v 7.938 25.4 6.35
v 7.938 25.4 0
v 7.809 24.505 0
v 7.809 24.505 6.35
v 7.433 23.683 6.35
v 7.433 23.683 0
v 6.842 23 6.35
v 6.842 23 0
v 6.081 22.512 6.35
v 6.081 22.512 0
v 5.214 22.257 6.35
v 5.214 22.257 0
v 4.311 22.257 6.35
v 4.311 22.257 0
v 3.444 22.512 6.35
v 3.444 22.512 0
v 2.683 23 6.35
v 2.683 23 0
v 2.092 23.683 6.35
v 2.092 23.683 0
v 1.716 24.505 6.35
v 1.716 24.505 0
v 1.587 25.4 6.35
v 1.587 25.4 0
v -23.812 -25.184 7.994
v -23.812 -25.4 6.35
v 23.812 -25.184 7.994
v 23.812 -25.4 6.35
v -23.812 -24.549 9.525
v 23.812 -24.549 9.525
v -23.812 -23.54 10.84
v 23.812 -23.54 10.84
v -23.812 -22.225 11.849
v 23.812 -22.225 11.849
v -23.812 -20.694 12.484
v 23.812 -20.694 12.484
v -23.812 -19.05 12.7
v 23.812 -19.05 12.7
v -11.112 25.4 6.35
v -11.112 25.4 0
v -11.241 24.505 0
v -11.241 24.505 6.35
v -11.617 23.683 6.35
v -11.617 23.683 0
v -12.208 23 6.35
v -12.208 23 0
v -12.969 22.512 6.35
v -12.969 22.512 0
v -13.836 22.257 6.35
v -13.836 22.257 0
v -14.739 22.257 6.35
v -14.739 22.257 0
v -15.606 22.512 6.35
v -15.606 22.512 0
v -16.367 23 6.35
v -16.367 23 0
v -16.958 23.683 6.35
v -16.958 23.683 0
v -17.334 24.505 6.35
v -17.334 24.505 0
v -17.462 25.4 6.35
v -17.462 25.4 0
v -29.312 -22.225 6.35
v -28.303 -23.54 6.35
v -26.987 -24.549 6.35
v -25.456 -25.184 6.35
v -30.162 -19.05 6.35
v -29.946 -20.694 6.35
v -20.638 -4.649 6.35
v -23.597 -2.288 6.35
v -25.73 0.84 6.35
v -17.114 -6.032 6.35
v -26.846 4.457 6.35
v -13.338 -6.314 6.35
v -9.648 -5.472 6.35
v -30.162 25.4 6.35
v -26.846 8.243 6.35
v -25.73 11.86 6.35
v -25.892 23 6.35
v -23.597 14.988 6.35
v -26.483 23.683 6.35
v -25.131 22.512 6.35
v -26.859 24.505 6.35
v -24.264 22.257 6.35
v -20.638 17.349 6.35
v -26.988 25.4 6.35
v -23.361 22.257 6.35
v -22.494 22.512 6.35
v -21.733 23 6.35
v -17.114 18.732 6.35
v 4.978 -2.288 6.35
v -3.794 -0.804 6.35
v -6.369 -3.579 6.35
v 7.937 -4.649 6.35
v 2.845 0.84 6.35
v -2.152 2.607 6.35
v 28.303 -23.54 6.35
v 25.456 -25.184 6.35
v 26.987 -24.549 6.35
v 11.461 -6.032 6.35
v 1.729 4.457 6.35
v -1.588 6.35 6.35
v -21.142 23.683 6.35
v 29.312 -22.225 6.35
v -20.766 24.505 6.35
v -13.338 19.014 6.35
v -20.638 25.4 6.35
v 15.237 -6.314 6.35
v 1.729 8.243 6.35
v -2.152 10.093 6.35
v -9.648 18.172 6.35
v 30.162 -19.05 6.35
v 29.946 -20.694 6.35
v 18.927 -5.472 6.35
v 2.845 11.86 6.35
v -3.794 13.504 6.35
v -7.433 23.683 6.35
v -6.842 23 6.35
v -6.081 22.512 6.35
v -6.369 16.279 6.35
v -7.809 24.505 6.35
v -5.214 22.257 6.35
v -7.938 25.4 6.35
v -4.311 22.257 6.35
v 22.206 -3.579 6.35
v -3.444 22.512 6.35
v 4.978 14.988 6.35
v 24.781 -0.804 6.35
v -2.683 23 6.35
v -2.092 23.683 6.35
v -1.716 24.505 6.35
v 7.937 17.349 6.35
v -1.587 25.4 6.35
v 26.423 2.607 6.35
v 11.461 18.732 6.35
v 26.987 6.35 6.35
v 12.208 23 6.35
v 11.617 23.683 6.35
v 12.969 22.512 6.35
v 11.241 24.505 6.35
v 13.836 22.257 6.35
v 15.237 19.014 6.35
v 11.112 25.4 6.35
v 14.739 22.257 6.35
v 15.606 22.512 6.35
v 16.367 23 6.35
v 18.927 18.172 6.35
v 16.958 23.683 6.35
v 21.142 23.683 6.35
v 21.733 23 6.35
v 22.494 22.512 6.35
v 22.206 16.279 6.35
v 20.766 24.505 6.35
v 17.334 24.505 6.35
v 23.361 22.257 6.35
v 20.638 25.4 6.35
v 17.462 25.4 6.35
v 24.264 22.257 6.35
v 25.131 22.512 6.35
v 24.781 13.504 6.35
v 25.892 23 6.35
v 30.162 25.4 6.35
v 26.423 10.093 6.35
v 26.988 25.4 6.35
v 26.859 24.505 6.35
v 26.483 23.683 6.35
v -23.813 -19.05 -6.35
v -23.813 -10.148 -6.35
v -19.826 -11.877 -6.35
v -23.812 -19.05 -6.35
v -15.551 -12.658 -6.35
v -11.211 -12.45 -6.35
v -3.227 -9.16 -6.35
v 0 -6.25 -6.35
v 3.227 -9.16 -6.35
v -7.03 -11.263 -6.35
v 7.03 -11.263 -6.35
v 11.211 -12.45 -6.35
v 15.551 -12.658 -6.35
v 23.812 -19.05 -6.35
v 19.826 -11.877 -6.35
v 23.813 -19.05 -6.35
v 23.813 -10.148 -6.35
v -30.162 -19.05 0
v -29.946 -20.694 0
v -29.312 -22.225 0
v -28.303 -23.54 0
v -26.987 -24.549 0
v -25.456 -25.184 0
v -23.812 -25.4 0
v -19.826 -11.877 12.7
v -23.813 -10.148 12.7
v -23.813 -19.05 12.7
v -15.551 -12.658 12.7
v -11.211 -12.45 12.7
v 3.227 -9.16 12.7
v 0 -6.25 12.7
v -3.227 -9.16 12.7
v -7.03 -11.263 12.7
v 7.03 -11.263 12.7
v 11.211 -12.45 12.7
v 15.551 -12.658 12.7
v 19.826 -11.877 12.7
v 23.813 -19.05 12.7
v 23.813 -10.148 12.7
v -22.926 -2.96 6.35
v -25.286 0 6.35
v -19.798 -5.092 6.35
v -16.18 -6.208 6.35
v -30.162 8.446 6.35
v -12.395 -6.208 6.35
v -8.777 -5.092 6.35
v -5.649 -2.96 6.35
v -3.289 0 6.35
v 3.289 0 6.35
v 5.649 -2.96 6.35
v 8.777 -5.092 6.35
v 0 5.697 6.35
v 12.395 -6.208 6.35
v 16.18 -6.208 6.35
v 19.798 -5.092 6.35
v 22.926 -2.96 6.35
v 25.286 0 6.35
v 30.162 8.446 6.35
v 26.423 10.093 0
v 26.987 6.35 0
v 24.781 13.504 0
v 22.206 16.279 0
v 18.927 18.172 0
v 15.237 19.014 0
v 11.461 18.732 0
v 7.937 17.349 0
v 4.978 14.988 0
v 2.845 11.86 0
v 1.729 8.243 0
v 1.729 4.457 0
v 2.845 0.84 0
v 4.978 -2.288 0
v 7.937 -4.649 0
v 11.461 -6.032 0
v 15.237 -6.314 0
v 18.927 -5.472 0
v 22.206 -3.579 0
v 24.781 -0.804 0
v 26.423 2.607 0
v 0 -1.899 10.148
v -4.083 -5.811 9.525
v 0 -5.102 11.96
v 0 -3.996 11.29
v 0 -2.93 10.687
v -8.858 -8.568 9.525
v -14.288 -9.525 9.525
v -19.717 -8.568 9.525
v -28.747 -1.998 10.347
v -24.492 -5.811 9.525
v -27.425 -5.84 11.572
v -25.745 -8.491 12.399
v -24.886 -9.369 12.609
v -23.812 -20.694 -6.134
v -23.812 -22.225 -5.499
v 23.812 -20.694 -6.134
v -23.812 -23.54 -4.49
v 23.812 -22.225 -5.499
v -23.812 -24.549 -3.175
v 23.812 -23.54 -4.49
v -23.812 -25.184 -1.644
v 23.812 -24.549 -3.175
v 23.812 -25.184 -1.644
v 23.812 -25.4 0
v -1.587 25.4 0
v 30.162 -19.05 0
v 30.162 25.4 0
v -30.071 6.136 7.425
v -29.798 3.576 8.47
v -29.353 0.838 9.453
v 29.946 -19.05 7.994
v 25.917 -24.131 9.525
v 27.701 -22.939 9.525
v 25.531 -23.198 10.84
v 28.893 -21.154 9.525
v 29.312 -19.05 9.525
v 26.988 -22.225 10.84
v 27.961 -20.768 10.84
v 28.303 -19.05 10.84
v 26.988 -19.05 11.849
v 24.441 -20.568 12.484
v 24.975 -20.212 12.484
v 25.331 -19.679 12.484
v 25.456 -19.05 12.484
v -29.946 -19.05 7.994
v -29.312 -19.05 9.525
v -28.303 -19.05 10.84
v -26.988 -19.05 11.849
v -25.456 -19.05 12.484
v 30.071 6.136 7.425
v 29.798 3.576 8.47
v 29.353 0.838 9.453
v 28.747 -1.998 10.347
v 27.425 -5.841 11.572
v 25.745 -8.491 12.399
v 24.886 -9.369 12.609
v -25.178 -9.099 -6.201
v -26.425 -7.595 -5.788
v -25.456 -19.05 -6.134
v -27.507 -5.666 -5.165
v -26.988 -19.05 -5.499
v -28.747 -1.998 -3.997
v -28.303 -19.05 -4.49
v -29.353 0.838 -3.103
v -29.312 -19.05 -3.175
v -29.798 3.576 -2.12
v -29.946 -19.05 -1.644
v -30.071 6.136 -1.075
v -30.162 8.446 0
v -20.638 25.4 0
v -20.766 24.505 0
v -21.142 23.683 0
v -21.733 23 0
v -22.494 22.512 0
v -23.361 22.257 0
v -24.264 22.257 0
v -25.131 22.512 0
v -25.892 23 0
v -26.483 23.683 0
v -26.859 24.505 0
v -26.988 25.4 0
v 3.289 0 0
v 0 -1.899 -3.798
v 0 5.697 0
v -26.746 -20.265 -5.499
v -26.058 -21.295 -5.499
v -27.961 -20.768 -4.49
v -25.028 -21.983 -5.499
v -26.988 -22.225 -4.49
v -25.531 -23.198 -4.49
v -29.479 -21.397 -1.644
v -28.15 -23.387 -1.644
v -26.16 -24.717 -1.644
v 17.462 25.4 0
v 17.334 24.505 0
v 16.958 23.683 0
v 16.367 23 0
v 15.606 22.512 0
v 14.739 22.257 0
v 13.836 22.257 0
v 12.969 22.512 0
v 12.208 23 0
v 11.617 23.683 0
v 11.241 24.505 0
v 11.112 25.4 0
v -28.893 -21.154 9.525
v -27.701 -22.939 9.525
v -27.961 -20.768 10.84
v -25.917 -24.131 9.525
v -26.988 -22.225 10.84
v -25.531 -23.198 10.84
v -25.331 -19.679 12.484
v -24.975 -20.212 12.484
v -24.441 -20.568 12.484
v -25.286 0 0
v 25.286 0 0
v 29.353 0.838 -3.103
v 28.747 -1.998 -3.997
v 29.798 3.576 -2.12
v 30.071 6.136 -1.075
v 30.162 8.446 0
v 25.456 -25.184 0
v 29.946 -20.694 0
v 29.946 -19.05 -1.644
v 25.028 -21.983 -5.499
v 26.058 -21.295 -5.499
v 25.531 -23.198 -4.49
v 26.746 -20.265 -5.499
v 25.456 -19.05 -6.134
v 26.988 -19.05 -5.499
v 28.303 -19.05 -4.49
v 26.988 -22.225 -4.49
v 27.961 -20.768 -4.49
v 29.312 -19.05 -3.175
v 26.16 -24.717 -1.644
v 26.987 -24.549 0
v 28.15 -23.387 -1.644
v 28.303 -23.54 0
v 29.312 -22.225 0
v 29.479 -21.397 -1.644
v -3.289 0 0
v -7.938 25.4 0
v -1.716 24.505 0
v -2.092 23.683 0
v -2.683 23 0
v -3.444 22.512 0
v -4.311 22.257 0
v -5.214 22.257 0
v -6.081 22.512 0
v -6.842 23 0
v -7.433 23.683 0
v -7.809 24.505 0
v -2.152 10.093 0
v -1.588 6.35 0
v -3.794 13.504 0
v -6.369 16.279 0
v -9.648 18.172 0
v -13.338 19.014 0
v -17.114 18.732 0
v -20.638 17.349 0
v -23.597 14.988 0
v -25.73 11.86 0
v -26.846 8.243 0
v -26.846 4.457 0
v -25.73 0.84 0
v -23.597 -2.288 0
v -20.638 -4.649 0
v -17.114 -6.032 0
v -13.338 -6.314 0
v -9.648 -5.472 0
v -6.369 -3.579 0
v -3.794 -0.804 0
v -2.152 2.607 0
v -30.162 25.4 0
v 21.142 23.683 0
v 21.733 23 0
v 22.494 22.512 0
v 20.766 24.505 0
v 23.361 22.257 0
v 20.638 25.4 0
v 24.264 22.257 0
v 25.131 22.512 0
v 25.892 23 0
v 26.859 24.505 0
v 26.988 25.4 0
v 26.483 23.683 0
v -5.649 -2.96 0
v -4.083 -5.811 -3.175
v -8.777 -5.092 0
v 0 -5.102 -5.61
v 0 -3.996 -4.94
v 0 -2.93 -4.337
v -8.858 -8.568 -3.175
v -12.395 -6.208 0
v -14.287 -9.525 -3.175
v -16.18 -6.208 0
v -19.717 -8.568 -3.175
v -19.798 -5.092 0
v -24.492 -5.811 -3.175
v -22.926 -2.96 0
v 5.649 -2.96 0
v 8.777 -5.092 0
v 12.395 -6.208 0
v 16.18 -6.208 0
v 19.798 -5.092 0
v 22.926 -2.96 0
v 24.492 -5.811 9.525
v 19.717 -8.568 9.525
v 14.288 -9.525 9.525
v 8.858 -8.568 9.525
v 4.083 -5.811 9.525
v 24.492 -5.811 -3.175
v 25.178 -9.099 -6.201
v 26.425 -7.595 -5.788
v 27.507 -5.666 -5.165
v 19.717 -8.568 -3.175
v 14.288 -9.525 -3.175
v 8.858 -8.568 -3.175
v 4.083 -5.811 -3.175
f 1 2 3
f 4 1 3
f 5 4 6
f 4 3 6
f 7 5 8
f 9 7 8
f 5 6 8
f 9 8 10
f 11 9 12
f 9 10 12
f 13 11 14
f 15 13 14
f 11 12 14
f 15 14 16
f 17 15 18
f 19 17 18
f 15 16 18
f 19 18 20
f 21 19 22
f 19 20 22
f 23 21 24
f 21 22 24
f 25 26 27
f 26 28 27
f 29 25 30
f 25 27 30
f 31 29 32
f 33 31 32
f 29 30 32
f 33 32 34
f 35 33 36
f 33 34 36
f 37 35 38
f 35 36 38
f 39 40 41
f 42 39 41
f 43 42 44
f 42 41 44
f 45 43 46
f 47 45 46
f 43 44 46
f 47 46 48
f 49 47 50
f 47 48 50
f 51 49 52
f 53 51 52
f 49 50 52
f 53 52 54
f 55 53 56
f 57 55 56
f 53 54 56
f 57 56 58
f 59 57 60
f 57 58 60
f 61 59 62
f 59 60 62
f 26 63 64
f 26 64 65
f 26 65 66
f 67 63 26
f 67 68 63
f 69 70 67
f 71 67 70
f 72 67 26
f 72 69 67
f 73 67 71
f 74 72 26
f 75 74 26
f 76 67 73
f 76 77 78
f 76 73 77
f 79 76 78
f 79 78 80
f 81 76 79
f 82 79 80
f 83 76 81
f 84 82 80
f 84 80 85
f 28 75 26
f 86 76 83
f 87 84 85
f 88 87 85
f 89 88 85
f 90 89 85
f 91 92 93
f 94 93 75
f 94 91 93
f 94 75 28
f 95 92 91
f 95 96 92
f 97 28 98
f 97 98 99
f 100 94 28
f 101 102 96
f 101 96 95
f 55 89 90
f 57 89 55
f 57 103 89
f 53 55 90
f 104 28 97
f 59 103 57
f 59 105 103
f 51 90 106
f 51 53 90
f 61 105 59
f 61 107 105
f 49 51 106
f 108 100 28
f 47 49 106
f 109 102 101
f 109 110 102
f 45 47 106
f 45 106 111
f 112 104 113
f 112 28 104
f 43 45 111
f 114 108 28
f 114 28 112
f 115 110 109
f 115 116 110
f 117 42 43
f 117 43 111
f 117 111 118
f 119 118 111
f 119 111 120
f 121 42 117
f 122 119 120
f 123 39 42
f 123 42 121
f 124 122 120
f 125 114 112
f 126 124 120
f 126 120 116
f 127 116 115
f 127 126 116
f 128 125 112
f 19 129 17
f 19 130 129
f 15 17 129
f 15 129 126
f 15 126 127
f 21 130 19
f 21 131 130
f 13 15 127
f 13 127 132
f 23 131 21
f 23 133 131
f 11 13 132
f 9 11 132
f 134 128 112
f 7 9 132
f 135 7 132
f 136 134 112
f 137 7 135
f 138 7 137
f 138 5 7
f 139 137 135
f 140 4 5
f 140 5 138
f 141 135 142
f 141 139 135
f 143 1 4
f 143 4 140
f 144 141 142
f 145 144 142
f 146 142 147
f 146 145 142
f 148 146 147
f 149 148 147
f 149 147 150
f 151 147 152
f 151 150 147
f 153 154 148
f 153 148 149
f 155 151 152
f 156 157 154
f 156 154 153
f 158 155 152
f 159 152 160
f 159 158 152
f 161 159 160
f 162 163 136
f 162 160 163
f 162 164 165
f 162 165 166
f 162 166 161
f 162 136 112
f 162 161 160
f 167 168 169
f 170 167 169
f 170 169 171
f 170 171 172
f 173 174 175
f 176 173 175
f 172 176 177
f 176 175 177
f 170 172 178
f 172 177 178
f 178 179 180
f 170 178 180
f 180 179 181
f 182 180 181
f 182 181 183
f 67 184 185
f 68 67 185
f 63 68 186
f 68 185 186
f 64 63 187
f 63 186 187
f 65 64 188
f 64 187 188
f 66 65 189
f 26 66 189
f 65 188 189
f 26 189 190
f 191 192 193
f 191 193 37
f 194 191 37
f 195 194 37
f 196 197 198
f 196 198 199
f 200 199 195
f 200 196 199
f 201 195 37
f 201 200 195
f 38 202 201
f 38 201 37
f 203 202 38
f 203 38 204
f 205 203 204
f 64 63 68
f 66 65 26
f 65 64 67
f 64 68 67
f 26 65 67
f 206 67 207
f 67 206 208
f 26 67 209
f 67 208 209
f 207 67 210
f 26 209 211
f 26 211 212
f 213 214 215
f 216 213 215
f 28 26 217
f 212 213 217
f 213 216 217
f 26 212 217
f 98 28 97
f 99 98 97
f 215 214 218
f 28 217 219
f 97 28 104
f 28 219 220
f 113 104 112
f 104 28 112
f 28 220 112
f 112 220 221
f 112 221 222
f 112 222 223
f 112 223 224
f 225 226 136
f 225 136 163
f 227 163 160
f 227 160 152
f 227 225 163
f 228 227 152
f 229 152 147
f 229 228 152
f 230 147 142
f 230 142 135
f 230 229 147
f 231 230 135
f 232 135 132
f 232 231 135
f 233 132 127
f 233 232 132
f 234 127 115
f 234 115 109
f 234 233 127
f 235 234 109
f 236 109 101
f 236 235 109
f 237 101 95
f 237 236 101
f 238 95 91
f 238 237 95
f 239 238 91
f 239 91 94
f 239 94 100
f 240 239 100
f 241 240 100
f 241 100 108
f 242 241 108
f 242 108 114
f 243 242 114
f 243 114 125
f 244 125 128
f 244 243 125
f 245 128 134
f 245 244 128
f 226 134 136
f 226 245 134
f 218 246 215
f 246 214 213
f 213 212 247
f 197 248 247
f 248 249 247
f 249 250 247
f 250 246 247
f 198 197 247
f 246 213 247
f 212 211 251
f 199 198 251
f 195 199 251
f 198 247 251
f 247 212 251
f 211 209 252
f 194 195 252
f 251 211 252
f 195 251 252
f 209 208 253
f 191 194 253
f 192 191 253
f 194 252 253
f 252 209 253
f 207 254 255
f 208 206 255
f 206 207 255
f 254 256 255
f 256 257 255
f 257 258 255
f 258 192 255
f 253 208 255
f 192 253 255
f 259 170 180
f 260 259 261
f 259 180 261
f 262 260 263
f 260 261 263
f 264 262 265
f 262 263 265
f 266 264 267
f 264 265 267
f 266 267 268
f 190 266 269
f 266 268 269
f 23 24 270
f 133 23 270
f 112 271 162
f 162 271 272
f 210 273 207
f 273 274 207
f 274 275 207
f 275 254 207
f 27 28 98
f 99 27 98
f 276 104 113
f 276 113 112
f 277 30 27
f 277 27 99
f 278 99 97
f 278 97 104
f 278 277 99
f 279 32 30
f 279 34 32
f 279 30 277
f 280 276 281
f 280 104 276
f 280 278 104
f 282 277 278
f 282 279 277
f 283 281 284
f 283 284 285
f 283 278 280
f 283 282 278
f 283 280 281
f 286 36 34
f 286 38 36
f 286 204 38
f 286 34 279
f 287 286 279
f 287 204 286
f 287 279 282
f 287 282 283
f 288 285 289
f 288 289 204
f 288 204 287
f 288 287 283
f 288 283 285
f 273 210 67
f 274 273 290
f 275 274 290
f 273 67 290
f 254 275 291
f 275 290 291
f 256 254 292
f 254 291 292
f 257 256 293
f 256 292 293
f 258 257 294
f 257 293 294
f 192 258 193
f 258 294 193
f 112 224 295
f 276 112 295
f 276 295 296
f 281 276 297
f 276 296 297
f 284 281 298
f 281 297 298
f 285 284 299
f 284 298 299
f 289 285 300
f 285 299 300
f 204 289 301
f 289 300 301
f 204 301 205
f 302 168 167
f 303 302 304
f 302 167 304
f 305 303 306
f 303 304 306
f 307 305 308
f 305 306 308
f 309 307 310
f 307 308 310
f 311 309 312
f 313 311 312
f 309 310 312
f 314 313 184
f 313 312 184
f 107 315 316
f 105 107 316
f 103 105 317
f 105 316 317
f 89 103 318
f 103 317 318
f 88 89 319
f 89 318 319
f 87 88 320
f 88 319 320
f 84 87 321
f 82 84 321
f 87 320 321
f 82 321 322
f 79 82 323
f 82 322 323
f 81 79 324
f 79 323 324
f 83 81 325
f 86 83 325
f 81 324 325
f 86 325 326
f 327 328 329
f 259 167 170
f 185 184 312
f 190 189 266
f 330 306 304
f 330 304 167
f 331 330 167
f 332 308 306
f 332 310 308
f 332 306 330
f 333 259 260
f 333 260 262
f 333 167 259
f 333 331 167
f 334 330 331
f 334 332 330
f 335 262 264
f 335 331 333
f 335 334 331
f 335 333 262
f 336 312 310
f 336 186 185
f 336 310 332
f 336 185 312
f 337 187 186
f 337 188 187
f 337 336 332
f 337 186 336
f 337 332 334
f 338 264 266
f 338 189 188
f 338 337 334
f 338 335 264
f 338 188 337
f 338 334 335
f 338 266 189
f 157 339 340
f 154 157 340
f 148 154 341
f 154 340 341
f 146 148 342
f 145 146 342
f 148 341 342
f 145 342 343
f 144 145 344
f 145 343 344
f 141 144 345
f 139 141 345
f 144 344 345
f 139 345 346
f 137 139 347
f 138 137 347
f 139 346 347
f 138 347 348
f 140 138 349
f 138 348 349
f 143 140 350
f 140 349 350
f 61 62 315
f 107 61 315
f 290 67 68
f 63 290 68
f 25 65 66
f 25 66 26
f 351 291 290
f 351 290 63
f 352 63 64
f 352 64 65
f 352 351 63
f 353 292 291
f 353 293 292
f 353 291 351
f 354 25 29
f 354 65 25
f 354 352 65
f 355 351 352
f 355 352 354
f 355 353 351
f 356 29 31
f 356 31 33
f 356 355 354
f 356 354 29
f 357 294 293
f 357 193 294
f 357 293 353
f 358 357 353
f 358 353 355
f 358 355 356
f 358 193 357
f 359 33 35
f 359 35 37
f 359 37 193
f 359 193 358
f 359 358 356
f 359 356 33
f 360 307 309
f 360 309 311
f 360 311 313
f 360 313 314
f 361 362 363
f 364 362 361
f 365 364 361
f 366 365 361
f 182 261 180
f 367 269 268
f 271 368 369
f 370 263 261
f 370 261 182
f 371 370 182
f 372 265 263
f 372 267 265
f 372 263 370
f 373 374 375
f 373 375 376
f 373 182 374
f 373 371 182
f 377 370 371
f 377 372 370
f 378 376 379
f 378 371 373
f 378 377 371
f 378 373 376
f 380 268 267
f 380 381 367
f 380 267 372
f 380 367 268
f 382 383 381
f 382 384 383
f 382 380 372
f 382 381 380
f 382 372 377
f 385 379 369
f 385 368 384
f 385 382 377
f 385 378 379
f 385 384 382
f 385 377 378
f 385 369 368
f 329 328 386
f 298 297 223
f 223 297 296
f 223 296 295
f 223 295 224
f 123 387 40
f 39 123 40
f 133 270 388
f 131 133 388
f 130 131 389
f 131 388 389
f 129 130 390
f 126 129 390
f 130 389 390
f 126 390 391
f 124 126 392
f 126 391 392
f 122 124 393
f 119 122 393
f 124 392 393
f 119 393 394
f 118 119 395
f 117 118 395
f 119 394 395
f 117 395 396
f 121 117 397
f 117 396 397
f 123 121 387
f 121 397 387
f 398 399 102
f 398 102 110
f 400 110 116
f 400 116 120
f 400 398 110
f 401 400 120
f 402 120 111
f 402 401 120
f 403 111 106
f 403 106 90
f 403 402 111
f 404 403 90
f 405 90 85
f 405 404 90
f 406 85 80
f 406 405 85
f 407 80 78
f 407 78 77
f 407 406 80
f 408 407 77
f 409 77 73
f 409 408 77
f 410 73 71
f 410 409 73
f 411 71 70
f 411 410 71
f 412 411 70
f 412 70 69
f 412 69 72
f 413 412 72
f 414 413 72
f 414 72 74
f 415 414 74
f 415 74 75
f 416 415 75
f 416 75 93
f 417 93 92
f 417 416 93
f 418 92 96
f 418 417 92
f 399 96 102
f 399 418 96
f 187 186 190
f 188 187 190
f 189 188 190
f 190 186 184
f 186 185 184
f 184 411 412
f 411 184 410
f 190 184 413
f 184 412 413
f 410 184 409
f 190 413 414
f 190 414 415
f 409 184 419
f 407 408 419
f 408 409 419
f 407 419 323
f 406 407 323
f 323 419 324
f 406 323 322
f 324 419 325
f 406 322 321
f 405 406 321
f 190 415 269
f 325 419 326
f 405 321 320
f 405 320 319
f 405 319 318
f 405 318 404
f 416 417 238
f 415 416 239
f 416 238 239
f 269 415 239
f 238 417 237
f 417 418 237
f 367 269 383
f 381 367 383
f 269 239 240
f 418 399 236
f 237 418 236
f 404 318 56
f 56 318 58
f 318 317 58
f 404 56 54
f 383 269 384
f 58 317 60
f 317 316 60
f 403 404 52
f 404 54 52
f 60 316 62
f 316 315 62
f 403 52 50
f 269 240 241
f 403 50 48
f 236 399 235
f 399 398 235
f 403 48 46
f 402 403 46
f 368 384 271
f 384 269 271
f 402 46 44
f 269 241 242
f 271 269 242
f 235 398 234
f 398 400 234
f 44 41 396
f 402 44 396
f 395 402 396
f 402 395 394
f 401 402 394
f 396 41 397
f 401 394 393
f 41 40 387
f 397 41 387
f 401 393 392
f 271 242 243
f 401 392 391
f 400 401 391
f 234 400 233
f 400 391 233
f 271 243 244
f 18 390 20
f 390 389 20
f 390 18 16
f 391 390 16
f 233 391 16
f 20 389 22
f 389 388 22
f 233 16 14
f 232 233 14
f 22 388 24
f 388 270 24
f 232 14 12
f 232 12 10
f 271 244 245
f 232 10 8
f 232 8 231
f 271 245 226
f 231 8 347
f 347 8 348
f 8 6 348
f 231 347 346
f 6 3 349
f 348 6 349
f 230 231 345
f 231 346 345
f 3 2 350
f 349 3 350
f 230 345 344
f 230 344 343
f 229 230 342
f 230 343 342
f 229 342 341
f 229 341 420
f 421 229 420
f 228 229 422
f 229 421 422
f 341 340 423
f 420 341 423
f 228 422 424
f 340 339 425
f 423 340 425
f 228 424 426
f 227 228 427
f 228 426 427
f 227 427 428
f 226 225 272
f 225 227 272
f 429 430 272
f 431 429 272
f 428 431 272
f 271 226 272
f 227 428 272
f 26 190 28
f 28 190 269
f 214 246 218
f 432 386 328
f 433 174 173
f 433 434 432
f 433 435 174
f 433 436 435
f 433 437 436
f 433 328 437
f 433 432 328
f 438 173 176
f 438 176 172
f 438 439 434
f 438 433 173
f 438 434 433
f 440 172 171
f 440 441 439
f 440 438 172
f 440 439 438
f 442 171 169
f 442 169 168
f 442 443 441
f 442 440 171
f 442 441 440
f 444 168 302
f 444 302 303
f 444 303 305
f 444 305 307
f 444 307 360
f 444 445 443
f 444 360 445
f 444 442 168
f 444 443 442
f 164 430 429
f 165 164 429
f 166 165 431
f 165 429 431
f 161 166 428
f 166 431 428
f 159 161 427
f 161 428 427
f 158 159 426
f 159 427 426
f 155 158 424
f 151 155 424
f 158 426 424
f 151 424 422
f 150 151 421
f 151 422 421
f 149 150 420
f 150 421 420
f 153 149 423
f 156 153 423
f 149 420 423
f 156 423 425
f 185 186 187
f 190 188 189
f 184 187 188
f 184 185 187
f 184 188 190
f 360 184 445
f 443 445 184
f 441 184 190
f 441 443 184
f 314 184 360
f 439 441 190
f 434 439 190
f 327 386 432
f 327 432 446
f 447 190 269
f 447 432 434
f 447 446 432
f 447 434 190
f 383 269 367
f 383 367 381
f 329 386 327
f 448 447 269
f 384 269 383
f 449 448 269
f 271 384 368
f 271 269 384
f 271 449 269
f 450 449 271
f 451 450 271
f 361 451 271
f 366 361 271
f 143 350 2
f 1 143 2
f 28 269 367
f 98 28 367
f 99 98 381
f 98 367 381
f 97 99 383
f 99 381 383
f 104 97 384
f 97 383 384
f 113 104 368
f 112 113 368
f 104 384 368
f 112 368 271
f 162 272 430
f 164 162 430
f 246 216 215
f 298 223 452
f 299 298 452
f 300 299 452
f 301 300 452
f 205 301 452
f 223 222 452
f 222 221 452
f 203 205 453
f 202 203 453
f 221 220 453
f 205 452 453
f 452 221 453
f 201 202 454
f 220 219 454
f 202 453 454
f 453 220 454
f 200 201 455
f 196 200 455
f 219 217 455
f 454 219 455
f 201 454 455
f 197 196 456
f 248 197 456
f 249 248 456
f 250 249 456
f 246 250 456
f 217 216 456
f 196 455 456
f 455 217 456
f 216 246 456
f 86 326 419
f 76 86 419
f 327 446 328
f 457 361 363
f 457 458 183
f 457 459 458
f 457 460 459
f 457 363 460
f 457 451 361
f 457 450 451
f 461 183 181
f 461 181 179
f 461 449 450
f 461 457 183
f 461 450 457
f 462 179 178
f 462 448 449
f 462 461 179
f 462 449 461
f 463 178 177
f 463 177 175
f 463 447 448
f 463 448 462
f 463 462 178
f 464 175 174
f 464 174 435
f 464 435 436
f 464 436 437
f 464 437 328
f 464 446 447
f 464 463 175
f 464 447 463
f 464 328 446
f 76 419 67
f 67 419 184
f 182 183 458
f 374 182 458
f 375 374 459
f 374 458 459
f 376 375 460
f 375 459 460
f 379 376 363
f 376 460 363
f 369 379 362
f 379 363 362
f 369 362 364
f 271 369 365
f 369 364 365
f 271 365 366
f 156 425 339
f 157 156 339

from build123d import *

# Parameters (mm, degrees)
F0_R           = 12.7
F1_DEPTH       = 6.35
F3_START       = 6.35
F3_DEPTH       = 6.35
F4_DEPTH       = 6.35
F5_T1_DEPTH    = 26.0831417175
F5_T3_DEPTH    = 22.9081417175
F5_T5_DEPTH    = 22.9081417175
F5_T7_DEPTH    = 26.0831417175
F5_T10_ANGLE   = 120
F5_T12_ANGLE   = 120
F5_2_T1_DEPTH  = 22.9081417175
F5_2_T3_DEPTH  = 26.0831417175
F5_2_T5_DEPTH  = 26.0831417175
F5_2_T7_DEPTH  = 22.9081417175
F5_2_T10_ANGLE = 120
F5_2_T12_ANGLE = 120
F6_R           = 6.34999
F6_2_R         = 6.34999


# Not quite as in the source:
# - a fillet or chamfer that OpenCascade refuses, or shapes differently, is made with other operations: its cross-section is extruded or revolved along the edge and cut away or added
# - a fillet or chamfer is up to 0.001 mm smaller than in the source, because OpenCascade refuses the exact size


with BuildPart() as f1:
    # F0 (on Top) → F1 (new body)
    with BuildSketch(Plane.XY):
        with BuildLine():
            Line((-23.8125, -25.4), (23.8125, -25.4))
            ThreePointArc((23.8125, -25.4), (28.3026280605, -23.5401280605), (30.1625, -19.05))
            Line((30.1625, -19.05), (30.1625, 25.4))
            Line((30.1625, 25.4), (26.9875, 25.4))
            ThreePointArc((26.9875, 25.4), (23.8125, 22.225), (20.6375, 25.4))
            Line((20.6375, 25.4), (17.4625, 25.4))
            ThreePointArc((17.4625, 25.4), (14.2875, 22.225), (11.1125, 25.4))
            Line((11.1125, 25.4), (7.9375, 25.4))
            ThreePointArc((7.9375, 25.4), (4.7625, 22.225), (1.5875, 25.4))
            Line((1.5875, 25.4), (-1.5875, 25.4))
            ThreePointArc((-1.5875, 25.4), (-4.7625, 22.225), (-7.9375, 25.4))
            Line((-7.9375, 25.4), (-11.1125, 25.4))
            ThreePointArc((-11.1125, 25.4), (-14.2875, 22.225), (-17.4625, 25.4))
            Line((-17.4625, 25.4), (-20.6375, 25.4))
            ThreePointArc((-20.6375, 25.4), (-23.8125, 22.225), (-26.9875, 25.4))
            Line((-26.9875, 25.4), (-30.1625, 25.4))
            Line((-30.1625, 25.4), (-30.1625, -19.05))
            ThreePointArc((-30.1625, -19.05), (-28.3026280605, -23.5401280605), (-23.8125, -25.4))
        make_face()
        with Locations((-14.2875, 6.35)):
            Circle(F0_R, mode=Mode.SUBTRACT)
        with Locations((14.2875, 6.35)):
            Circle(F0_R, mode=Mode.SUBTRACT)
    extrude(amount=F1_DEPTH)


with BuildPart() as f3:
    # F2 (on Top) → F3 (new body)
    with BuildSketch(Plane.XY.offset(F3_START)):
        with BuildLine():
            Line((-23.8125, -25.4), (23.8125, -25.4))
            ThreePointArc((23.8125, -25.4), (28.3026280605, -23.5401280605), (30.1625, -19.05))
            Line((30.1625, -19.05), (30.1625, 0))
            Line((30.1625, 0), (30.1625, 8.4463065702))
            Line((30.1625, 8.4463065702), (25.2860226281, 0))
            ThreePointArc((25.2860226281, 0), (14.2875, -6.35), (3.2889773719, 0))
            Line((3.2889773719, 0), (0, 5.6966759131))
            Line((0, 5.6966759131), (-3.2889773719, 0))
            ThreePointArc((-3.2889773719, 0), (-14.2875, -6.35), (-25.2860226281, 0))
            Line((-25.2860226281, 0), (-30.1625, 8.4463065702))
            Line((-30.1625, 8.4463065702), (-30.1625, 0))
            Line((-30.1625, 0), (-30.1625, -19.05))
            ThreePointArc((-30.1625, -19.05), (-28.3026280605, -23.5401280605), (-23.8125, -25.4))
        make_face()
    extrude(amount=F3_DEPTH)

    # F5: chamfer of 6.35 on 2 edges, made by hand

    # F5_s2 → F5_t1 (cut)
    with BuildSketch(Plane(origin=(19.3630765157, 33.5378323161, 0), x_dir=(0, 0, 1), z_dir=(-0.5, -0.8660254038, 0))):
        Polygon((12.7, -28.2483379566), (6.35, -21.8983379566), (12.7, -21.8983379566), align=None)
    extrude(amount=F5_T1_DEPTH, mode=Mode.SUBTRACT)

    # F5_s4 → F5_t3 (cut)
    with BuildSketch(Plane(origin=(0.822244343, -1.4241689783, 0), x_dir=(0, 0, 1), z_dir=(-0.5, 0.8660254038, 0))):
        Polygon((12.7, -3.5016620434), (6.35, 2.8483379566), (12.7, 2.8483379566), align=None)
    extrude(amount=F5_T3_DEPTH, mode=Mode.SUBTRACT)

    # F5_s6 → F5_t5 (cut)
    with BuildSketch(Plane(origin=(10.6318265157, 18.4148637025, 0), x_dir=(0, 0, 1), z_dir=(-0.5, -0.8660254038, 0))):
        Polygon((12.7, -3.5016620434), (6.35, 2.8483379566), (12.7, 2.8483379566), align=None)
    extrude(amount=F5_T5_DEPTH, mode=Mode.SUBTRACT)

    # F5_s8 → F5_t7 (cut)
    with BuildSketch(Plane(origin=(-6.321505657, 10.9491689783, 0), x_dir=(0, 0, 1), z_dir=(-0.5, 0.8660254038, 0))):
        Polygon((12.7, -28.2483379566), (6.35, -21.8983379566), (12.7, -21.8983379566), align=None)
    extrude(amount=F5_T7_DEPTH, mode=Mode.SUBTRACT)

    # F5_s9 → F5_t10 (revolve, cut)
    with BuildSketch(Plane(origin=(-0.822244343, -1.4241689783, 0), x_dir=(0, 0, 1), z_dir=(0.5, 0.8660254038, 0))):
        Polygon((12.7, 3.5016620434), (6.35, -2.8483379566), (12.7, -2.8483379566), align=None)
    revolve(axis=Axis((-14.2875, 6.35, 12.7), (0, 0, -1)), revolution_arc=F5_T10_ANGLE, mode=Mode.SUBTRACT)

    # F5_s11 → F5_t12 (revolve, cut)
    with BuildSketch(Plane(origin=(6.321505657, 10.9491689783, 0), x_dir=(0, 0, 1), z_dir=(0.5, 0.8660254038, 0))):
        Polygon((12.7, 28.2483379566), (6.35, 21.8983379566), (12.7, 21.8983379566), align=None)
    revolve(axis=Axis((14.2875, 6.35, 12.7), (0, 0, -1)), revolution_arc=F5_T12_ANGLE, mode=Mode.SUBTRACT)

    # F6 (radius 6.35 in the source; OpenCascade refuses exactly that, so slightly less here)
    f6_edges = [f3.edges().sort_by_distance(p)[0] for p in [
        (0, -25.4, 12.7),
        (-28.302628, -23.540128, 12.7),
        (-30.1625, -11.615142, 12.7),
        (28.302628, -23.540128, 12.7),
        (30.1625, -11.615142, 12.7),
    ]]
    fillet(f6_edges, radius=F6_R)


with BuildPart() as f4:
    # F2 (on Top) → F4 (new body)
    with BuildSketch(Plane.XY):
        with BuildLine():
            Line((-23.8125, -25.4), (23.8125, -25.4))
            ThreePointArc((23.8125, -25.4), (28.3026280605, -23.5401280605), (30.1625, -19.05))
            Line((30.1625, -19.05), (30.1625, 0))
            Line((30.1625, 0), (30.1625, 8.4463065702))
            Line((30.1625, 8.4463065702), (25.2860226281, 0))
            ThreePointArc((25.2860226281, 0), (14.2875, -6.35), (3.2889773719, 0))
            Line((3.2889773719, 0), (0, 5.6966759131))
            Line((0, 5.6966759131), (-3.2889773719, 0))
            ThreePointArc((-3.2889773719, 0), (-14.2875, -6.35), (-25.2860226281, 0))
            Line((-25.2860226281, 0), (-30.1625, 8.4463065702))
            Line((-30.1625, 8.4463065702), (-30.1625, 0))
            Line((-30.1625, 0), (-30.1625, -19.05))
            ThreePointArc((-30.1625, -19.05), (-28.3026280605, -23.5401280605), (-23.8125, -25.4))
        make_face()
    extrude(amount=-F4_DEPTH)

    # F5#2: chamfer of 6.35 on 2 edges, made by hand

    # F5_2_s2 → F5_2_t1 (cut)
    with BuildSketch(Plane(origin=(10.6318265157, 18.4148637025, 0), x_dir=(0, 0, 1), z_dir=(-0.5, -0.8660254038, 0))):
        Polygon((-6.35, -3.5016620434), (0, 2.8483379566), (-6.35, 2.8483379566), align=None)
    extrude(amount=F5_2_T1_DEPTH, mode=Mode.SUBTRACT)

    # F5_2_s4 → F5_2_t3 (cut)
    with BuildSketch(Plane(origin=(-6.321505657, 10.9491689783, 0), x_dir=(0, 0, 1), z_dir=(-0.5, 0.8660254038, 0))):
        Polygon((-6.35, -28.2483379566), (0, -21.8983379566), (-6.35, -21.8983379566), align=None)
    extrude(amount=F5_2_T3_DEPTH, mode=Mode.SUBTRACT)

    # F5_2_s6 → F5_2_t5 (cut)
    with BuildSketch(Plane(origin=(19.3630765157, 33.5378323161, 0), x_dir=(0, 0, 1), z_dir=(-0.5, -0.8660254038, 0))):
        Polygon((-6.35, -28.2483379566), (0, -21.8983379566), (-6.35, -21.8983379566), align=None)
    extrude(amount=F5_2_T5_DEPTH, mode=Mode.SUBTRACT)

    # F5_2_s8 → F5_2_t7 (cut)
    with BuildSketch(Plane(origin=(0.822244343, -1.4241689783, 0), x_dir=(0, 0, 1), z_dir=(-0.5, 0.8660254038, 0))):
        Polygon((-6.35, -3.5016620434), (0, 2.8483379566), (-6.35, 2.8483379566), align=None)
    extrude(amount=F5_2_T7_DEPTH, mode=Mode.SUBTRACT)

    # F5_2_s9 → F5_2_t10 (revolve, cut)
    with BuildSketch(Plane(origin=(6.321505657, 10.9491689783, 0), x_dir=(0, 0, 1), z_dir=(0.5, 0.8660254038, 0))):
        Polygon((-6.35, 28.2483379566), (0, 21.8983379566), (-6.35, 21.8983379566), align=None)
    revolve(axis=Axis((14.2875, 6.35, -6.35), (0, 0, -1)), revolution_arc=F5_2_T10_ANGLE, mode=Mode.SUBTRACT)

    # F5_2_s11 → F5_2_t12 (revolve, cut)
    with BuildSketch(Plane(origin=(-0.822244343, -1.4241689783, 0), x_dir=(0, 0, 1), z_dir=(0.5, 0.8660254038, 0))):
        Polygon((-6.35, 3.5016620434), (0, -2.8483379566), (-6.35, -2.8483379566), align=None)
    revolve(axis=Axis((-14.2875, 6.35, -6.35), (0, 0, -1)), revolution_arc=F5_2_T12_ANGLE, mode=Mode.SUBTRACT)

    # F6#2 (radius 6.35 in the source; OpenCascade refuses exactly that, so slightly less here)
    f6_2_edges = [f4.edges().sort_by_distance(p)[0] for p in [
        (30.1625, -11.615142, -6.35),
        (28.302628, -23.540128, -6.35),
        (0, -25.4, -6.35),
        (-28.302628, -23.540128, -6.35),
        (-30.1625, -11.615142, -6.35),
    ]]
    fillet(f6_2_edges, radius=F6_2_R)


solid = Compound([f1.part, f3.part, f4.part])
